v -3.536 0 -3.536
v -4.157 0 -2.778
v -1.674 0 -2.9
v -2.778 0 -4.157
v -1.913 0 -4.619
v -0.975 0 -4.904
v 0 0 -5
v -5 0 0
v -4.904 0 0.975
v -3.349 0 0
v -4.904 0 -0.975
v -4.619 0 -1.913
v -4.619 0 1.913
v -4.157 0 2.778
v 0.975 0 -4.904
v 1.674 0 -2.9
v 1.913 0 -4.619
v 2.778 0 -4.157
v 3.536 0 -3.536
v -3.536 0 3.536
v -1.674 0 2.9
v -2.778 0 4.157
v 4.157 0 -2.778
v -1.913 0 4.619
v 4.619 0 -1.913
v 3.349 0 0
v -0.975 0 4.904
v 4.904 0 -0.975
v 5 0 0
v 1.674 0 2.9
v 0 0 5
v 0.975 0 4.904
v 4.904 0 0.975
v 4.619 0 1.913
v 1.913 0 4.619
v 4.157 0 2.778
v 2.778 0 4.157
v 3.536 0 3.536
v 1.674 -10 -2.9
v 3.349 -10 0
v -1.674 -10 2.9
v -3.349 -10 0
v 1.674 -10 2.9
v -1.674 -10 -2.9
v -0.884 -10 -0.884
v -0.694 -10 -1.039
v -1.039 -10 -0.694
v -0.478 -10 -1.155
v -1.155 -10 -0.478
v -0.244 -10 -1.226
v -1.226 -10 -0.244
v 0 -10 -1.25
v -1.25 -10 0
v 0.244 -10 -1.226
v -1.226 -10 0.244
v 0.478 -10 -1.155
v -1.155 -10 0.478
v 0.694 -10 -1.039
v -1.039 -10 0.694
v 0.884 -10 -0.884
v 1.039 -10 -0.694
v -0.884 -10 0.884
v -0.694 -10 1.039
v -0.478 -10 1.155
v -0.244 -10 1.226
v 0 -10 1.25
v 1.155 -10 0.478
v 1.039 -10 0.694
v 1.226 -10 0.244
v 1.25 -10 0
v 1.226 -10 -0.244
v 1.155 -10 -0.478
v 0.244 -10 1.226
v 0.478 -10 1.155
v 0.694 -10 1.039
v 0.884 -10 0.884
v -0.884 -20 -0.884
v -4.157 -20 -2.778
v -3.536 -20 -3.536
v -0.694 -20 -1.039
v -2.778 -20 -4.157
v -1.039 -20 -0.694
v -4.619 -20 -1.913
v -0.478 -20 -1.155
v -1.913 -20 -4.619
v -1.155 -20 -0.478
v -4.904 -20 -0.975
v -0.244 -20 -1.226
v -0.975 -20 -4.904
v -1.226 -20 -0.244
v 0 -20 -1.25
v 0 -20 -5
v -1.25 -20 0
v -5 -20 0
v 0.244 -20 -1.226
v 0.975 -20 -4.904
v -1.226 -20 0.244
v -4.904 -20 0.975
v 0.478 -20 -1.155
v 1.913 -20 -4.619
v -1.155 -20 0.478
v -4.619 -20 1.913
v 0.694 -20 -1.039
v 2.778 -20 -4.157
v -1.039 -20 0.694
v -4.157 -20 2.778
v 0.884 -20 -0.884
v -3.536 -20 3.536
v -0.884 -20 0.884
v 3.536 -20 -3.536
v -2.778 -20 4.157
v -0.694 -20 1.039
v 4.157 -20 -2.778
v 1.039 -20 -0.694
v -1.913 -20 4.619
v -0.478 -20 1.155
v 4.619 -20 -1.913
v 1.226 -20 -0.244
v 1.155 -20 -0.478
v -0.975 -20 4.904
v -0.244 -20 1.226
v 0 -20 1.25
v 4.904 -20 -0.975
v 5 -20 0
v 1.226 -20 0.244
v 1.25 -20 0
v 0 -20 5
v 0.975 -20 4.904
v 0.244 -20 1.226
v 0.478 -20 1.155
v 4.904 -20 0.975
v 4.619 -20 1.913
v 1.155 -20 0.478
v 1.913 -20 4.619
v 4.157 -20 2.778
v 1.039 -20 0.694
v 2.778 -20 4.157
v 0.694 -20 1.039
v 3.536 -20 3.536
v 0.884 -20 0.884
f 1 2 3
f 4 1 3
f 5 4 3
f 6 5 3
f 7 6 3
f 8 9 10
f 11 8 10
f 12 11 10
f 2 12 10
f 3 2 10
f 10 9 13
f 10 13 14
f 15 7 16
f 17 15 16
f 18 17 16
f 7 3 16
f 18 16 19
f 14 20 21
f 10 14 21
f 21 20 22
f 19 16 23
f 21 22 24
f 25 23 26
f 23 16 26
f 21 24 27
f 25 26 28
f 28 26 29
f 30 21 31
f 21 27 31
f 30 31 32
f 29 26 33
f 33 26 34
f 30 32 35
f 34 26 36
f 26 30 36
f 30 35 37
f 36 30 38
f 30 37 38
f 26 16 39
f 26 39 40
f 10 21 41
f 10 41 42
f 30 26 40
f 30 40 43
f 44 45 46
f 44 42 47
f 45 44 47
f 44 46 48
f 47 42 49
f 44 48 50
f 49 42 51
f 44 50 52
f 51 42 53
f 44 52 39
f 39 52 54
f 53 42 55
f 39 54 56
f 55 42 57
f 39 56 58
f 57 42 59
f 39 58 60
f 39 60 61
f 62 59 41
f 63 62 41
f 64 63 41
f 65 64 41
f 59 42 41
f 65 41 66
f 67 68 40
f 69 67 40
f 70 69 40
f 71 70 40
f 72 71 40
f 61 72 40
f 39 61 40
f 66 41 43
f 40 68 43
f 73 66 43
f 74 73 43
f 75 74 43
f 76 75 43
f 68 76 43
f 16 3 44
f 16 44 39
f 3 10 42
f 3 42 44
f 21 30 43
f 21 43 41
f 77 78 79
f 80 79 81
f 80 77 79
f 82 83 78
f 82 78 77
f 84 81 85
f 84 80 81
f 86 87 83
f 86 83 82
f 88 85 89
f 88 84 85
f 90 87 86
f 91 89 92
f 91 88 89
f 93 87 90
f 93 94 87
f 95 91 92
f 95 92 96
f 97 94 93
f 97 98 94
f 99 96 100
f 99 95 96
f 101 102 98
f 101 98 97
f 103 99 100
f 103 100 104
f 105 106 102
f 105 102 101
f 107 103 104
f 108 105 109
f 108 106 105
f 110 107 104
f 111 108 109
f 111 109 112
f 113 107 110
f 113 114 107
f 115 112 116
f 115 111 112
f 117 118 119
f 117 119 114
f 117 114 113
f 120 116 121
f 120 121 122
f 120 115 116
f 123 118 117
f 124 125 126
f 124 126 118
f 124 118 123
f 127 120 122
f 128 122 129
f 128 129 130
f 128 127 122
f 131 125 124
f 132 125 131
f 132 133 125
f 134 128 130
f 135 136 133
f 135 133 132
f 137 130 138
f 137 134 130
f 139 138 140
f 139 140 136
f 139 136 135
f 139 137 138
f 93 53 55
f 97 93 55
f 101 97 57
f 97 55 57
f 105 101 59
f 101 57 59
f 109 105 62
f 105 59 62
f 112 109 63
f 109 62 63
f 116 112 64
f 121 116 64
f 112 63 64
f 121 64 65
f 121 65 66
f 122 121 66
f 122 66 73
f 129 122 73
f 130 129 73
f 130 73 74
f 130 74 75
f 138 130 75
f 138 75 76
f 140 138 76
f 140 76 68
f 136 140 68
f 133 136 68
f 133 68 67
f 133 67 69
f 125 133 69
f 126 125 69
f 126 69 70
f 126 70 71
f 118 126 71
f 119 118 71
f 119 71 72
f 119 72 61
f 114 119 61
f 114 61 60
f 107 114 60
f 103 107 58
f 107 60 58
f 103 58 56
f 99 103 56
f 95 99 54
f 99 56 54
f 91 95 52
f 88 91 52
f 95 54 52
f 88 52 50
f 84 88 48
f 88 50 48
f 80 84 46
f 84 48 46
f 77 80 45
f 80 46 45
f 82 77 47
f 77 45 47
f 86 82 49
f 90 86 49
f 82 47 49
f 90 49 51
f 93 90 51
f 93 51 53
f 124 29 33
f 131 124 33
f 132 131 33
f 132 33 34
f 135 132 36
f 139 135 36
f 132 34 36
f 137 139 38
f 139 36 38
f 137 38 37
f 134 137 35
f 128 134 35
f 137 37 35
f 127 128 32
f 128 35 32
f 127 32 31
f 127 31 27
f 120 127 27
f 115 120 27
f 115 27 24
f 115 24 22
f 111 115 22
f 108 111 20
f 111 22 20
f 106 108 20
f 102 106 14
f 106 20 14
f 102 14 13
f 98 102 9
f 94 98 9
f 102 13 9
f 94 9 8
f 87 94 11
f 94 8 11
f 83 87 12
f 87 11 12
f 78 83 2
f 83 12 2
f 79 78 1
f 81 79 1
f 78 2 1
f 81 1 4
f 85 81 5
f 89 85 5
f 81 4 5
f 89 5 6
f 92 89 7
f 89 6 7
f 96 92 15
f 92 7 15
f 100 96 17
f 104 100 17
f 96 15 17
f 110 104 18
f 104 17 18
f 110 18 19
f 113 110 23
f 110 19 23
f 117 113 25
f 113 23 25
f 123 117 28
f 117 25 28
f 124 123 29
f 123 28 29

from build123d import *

# Parameters (mm, degrees)
F0_R     = 5
F1_DEPTH = 20
F2_R     = 1.25
F3_DEPTH = 20.001
F5_DEPTH = 10


with BuildPart() as f1:
    # F0 (on Front) → F1 (new body)
    with BuildSketch(Plane.XZ):
        Circle(F0_R)
    extrude(amount=F1_DEPTH)

    # F2 (on face) → F3 (cut, through all)
    with BuildSketch(Plane(origin=(0, 0, 0), x_dir=(-1, 0, 0), z_dir=(0, 1, 0))):
        Circle(F2_R)
    extrude(amount=-F3_DEPTH, mode=Mode.SUBTRACT)

    # F4 (on Front) → F5 (cut)
    with BuildSketch(Plane.XZ):
        Polygon((1.674316, 2.9), (-1.674316, 2.9), (-3.348632, 0), (-1.674316, -2.9), (1.674316, -2.9), (3.348632, 0), align=None)
    extrude(amount=F5_DEPTH, mode=Mode.SUBTRACT)


solid = f1.part
